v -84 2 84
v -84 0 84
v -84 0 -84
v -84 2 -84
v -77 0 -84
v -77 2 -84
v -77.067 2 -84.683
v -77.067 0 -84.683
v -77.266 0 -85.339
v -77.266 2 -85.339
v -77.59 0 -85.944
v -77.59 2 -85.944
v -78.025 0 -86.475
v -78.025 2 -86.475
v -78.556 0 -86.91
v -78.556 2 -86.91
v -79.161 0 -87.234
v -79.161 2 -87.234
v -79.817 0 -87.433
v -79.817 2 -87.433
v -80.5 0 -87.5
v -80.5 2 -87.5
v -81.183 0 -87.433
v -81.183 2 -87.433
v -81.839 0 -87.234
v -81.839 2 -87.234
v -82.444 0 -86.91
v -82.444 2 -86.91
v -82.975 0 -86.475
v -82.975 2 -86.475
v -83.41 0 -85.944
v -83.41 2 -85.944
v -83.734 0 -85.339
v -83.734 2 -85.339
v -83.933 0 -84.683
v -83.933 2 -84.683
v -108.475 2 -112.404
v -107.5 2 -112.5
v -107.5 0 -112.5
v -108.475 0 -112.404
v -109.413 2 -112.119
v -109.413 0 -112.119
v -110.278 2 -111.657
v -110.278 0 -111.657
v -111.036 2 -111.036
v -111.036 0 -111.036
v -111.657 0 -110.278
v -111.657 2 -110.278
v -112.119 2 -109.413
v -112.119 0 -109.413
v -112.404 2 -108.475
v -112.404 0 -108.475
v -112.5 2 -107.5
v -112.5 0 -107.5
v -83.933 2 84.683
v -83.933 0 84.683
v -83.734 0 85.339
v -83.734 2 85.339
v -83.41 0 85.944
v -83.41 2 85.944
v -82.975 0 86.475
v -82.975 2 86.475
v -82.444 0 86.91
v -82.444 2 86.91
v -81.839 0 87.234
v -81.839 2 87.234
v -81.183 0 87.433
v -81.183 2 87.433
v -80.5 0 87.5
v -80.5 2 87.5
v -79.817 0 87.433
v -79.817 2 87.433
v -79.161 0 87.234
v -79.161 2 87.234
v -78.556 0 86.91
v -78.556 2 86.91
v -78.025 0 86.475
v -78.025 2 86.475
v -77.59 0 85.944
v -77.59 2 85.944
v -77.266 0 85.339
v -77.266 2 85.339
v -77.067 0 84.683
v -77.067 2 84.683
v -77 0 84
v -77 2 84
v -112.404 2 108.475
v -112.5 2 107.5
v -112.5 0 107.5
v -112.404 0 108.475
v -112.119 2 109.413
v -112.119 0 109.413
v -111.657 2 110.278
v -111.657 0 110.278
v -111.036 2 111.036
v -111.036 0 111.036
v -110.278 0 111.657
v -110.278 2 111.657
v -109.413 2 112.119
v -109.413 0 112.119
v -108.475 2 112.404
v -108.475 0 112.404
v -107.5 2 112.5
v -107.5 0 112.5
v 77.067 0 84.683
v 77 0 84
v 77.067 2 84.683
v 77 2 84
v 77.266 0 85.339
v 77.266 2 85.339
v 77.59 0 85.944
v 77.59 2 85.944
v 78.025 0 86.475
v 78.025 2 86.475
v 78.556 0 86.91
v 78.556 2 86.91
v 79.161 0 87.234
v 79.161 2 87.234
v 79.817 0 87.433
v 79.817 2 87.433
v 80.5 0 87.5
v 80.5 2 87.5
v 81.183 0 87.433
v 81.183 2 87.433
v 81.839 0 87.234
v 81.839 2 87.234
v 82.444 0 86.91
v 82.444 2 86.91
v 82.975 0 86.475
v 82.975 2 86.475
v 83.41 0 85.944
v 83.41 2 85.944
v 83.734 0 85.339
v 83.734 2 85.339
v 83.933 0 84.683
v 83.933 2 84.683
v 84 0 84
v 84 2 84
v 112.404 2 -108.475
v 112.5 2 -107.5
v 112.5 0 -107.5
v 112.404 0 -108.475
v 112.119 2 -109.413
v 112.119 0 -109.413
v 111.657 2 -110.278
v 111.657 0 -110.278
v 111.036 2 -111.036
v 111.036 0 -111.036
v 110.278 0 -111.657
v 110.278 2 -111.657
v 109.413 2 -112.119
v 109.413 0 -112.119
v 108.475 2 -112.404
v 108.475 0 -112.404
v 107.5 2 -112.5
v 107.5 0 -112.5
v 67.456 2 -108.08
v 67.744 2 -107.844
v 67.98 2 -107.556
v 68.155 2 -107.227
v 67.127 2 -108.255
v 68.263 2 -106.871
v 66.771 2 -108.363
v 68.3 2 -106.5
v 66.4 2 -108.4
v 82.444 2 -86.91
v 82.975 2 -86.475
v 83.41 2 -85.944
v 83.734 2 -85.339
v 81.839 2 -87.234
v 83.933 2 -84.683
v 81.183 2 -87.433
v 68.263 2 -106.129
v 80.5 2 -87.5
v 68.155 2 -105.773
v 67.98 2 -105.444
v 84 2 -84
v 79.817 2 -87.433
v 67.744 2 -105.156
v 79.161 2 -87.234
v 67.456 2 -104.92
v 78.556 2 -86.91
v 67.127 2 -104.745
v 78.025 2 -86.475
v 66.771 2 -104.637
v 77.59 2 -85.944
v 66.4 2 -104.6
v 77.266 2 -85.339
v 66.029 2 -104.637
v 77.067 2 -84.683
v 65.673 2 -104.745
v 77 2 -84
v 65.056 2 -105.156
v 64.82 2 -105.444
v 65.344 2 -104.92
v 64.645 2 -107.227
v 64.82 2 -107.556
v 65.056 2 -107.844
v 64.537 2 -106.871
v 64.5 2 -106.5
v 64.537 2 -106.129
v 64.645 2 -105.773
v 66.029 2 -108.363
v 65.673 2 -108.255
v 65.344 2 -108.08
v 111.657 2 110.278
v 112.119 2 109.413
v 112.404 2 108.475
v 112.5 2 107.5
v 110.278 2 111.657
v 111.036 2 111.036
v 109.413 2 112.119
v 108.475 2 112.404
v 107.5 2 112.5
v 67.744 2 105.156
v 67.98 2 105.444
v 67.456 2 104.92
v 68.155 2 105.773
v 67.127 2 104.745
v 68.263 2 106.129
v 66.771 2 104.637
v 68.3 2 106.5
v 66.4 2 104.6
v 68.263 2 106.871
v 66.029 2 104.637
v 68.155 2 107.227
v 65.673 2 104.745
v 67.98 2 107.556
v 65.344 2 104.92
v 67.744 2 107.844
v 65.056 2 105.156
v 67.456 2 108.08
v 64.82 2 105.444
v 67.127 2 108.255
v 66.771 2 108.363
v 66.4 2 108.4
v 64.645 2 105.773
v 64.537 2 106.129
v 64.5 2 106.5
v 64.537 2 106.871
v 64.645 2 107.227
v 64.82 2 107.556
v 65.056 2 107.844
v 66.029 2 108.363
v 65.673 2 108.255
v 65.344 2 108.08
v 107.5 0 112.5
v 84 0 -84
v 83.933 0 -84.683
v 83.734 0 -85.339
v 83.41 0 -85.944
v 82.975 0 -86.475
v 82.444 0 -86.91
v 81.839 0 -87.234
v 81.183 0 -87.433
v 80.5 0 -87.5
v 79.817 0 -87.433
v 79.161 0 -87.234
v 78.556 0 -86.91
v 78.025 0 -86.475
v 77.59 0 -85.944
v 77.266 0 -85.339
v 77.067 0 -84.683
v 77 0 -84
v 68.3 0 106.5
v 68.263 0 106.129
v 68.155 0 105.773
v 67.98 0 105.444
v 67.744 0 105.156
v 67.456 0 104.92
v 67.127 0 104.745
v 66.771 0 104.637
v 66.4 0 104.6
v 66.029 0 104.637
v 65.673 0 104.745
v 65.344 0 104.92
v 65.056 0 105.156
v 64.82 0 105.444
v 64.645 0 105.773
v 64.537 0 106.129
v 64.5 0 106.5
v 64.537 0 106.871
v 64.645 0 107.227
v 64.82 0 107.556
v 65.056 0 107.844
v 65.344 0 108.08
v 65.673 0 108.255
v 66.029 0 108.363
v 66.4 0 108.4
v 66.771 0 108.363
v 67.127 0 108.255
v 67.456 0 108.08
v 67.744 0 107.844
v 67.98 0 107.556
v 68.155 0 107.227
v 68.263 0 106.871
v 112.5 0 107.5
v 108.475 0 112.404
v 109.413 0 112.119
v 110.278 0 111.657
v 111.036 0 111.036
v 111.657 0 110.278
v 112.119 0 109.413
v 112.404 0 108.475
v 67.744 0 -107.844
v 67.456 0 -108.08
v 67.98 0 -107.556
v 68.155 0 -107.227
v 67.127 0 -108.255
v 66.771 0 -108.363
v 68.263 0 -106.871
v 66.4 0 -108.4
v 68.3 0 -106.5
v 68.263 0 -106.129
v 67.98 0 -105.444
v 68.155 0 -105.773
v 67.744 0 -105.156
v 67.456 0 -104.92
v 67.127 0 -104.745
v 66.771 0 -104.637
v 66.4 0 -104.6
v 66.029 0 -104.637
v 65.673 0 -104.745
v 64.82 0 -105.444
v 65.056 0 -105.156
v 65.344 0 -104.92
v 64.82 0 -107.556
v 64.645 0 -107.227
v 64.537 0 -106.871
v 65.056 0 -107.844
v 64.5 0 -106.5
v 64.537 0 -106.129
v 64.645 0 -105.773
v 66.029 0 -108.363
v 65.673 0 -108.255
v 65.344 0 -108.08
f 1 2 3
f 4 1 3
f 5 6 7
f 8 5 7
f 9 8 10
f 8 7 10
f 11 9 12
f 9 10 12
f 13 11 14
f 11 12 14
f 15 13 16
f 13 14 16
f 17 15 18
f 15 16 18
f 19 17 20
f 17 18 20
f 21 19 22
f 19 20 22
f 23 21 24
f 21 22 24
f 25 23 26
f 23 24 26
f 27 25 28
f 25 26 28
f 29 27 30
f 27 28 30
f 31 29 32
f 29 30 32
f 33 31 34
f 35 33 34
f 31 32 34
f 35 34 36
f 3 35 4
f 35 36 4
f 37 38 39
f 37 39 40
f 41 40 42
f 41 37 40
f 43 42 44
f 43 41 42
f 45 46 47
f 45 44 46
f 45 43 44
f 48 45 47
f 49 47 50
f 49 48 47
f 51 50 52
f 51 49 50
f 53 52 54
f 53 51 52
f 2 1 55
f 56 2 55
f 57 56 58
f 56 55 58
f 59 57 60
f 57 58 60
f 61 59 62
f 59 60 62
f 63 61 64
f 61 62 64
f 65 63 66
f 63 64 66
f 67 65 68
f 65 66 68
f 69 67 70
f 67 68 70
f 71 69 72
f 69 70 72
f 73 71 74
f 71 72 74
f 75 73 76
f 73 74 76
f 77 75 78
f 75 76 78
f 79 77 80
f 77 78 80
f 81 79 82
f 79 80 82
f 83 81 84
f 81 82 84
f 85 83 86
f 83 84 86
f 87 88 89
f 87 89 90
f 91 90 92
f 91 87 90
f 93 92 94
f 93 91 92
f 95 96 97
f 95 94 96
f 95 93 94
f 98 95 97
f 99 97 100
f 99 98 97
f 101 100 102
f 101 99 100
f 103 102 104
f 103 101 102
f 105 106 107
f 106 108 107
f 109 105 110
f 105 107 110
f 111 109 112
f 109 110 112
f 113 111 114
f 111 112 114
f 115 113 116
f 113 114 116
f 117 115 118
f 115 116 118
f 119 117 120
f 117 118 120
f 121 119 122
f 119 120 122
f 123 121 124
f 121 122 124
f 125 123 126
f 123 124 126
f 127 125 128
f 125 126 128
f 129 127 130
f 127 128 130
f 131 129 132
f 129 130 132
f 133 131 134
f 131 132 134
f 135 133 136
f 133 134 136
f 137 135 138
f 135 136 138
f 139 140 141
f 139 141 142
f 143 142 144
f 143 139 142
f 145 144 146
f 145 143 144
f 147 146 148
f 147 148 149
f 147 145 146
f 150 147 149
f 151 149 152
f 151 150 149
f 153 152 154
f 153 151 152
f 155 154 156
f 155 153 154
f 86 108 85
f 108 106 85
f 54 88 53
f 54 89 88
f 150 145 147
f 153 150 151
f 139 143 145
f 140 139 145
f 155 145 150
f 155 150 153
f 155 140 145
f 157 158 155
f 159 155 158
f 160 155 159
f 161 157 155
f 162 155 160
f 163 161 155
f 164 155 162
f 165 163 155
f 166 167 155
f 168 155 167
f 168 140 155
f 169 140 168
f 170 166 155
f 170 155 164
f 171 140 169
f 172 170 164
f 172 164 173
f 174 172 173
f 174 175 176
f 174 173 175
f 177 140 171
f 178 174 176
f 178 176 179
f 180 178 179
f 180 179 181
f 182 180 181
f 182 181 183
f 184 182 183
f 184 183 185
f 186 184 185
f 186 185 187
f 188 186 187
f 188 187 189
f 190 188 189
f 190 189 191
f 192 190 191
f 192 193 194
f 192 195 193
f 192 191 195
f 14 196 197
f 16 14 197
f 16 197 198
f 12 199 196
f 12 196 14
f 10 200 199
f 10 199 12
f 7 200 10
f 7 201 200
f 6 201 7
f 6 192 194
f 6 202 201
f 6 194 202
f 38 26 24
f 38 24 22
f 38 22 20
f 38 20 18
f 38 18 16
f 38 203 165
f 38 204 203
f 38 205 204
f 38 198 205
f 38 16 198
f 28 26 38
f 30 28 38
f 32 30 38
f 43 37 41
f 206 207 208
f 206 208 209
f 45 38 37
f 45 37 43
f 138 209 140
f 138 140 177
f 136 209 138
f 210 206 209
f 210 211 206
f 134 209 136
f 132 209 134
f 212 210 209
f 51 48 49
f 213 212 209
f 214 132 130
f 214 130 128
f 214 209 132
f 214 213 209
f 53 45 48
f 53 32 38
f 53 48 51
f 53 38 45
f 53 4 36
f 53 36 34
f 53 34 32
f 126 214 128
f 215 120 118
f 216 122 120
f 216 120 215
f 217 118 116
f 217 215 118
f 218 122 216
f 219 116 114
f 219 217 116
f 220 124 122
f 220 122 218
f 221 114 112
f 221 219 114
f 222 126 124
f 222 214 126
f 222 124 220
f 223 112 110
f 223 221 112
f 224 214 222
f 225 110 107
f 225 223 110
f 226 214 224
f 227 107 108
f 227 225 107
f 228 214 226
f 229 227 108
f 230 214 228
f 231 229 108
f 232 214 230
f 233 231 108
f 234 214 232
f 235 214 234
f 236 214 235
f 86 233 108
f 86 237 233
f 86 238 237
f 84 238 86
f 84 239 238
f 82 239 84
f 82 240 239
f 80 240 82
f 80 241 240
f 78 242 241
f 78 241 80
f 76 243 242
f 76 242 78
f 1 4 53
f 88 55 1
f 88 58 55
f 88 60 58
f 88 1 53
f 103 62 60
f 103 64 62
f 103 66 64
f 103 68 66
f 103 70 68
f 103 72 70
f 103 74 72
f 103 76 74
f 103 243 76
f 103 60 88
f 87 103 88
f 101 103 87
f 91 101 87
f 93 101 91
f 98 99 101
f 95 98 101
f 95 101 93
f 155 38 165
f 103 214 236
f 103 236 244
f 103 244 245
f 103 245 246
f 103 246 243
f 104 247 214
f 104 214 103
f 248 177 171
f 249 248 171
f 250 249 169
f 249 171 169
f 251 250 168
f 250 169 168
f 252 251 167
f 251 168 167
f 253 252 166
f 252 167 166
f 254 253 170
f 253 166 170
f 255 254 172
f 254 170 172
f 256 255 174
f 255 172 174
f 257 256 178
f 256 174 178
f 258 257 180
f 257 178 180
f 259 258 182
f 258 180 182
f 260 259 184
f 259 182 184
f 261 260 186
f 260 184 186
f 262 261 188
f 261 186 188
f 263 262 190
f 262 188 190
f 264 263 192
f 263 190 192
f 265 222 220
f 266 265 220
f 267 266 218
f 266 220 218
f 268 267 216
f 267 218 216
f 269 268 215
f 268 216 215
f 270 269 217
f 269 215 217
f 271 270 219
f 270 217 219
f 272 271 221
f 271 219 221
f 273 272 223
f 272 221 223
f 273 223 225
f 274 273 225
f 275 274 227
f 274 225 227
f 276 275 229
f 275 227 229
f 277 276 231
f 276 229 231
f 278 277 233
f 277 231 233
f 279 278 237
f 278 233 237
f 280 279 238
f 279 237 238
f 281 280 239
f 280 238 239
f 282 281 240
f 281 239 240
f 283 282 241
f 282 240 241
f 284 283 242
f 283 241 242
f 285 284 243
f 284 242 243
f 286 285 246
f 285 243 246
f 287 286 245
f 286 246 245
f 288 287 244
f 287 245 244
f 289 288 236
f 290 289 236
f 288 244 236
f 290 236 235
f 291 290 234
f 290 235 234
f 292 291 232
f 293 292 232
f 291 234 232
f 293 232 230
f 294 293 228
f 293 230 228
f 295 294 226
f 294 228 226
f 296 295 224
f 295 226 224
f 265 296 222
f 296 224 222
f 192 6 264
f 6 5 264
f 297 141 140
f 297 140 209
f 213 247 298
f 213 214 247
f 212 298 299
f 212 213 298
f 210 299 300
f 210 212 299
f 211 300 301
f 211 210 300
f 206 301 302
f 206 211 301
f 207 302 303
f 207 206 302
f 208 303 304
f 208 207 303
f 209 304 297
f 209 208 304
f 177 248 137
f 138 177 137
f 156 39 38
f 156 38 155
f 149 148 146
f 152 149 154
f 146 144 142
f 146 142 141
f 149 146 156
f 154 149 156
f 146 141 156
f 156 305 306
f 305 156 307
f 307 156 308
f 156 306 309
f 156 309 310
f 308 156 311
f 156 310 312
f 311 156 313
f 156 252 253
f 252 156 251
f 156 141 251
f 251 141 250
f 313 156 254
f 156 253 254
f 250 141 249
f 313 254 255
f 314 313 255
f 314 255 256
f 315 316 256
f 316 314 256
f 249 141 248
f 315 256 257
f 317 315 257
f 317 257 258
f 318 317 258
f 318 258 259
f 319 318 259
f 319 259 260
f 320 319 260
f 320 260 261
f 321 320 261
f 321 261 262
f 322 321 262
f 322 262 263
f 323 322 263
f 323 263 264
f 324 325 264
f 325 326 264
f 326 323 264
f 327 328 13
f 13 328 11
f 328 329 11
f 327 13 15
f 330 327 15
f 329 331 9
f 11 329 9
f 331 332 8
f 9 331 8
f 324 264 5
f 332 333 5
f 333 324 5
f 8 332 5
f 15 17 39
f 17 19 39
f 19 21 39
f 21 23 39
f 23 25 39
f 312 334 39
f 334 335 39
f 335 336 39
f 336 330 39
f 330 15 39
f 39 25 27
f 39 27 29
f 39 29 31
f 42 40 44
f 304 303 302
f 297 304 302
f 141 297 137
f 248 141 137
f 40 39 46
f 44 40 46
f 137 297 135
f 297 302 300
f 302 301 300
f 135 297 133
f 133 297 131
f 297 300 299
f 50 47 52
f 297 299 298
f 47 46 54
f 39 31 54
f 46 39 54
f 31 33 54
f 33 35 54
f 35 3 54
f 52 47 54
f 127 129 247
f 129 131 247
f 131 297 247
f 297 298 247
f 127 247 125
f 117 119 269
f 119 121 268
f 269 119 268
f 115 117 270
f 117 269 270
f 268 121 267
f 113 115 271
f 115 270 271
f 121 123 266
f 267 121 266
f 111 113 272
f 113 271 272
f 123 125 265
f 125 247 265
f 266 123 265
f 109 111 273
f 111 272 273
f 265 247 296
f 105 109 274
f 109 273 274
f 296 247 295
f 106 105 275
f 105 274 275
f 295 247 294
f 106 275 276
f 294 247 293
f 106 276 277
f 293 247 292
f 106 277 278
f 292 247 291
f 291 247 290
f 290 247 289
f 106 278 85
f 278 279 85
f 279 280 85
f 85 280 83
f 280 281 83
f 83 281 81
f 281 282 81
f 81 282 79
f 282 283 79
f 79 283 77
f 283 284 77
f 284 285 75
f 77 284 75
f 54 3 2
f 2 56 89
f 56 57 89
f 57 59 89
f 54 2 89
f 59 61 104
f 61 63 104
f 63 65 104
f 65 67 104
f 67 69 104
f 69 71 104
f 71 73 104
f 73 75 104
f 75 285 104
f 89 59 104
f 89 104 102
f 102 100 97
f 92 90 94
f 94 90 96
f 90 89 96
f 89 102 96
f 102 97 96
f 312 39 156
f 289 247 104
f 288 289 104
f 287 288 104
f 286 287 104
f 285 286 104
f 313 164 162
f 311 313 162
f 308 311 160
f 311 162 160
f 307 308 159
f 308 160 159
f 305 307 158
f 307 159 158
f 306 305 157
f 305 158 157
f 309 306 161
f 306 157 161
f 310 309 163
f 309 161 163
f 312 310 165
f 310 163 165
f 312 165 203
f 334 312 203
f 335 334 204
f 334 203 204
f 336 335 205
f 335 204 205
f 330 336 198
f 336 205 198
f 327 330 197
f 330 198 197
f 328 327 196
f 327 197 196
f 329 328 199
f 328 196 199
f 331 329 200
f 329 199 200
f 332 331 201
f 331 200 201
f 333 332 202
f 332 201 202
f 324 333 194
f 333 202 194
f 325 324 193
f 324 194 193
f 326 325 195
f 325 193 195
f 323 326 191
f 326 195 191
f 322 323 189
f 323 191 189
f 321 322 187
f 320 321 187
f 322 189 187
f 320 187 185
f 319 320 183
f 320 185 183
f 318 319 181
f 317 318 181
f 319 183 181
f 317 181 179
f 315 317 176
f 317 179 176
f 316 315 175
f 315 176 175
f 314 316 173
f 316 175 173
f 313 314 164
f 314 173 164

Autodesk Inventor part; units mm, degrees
ref_plane "YZ Plane" through (0, 0, 0) normal (1, 0, 0) x (0, 1, 0)
ref_plane "XZ Plane" through (0, 0, 0) normal (0, 1, 0) x (-1, 0, 0)
ref_plane "XY Plane" through (0, 0, 0) normal (0, 0, 1) x (1, 0, 0)
sketch "Sketch1" plane through (0, 0, 0) normal (0, 1, 0) x (-1, 0, 0)
  line L0 (-84, 84) -> (84, 84)
  line L1 (84, 84) -> (84, -84)
  line L2 (84, -84) -> (-84, -84)
  line L3 (-84, -84) -> (-84, 84)
  line L4 (-84, 84) -> (84, -84) construction
  line L5 (84, 84) -> (-84, -84) construction
  line L6 (-112.5, 112.5) -> (112.5, 112.5)
  line L7 (112.5, 112.5) -> (112.5, -112.5)
  line L8 (112.5, -112.5) -> (-112.5, -112.5)
  line L9 (-112.5, -112.5) -> (-112.5, 112.5)
  line L10 (-112.5, 112.5) -> (112.5, -112.5) construction
  line L11 (112.5, 112.5) -> (-112.5, -112.5) construction
  point P0 (0, 0)
  dimension "d0" = 168
  dimension "d1" = 168
  dimension "d2" = 225
  dimension "d3" = 225
extrude "Extrusion1" add sketch "Sketch1" along normal blind 2
sketch "Sketch2" plane through (0, 2, 0) normal (0, 1, 0) x (1, 0, 0)
  line L0 (0, 0) -> (-112.5, 0) construction
  line L1 (-112.5, 112.5) -> (-112.5, -112.5) projected
  circle A0 centre (66.4, -106.5) radius 1.9
  circle A1 centre (66.4, 106.5) radius 1.9
  dimension "d6" = 66.4
  dimension "d7" = 3.8
  dimension "d8" = 106.5
extrude "Extrusion2" cut sketch "Sketch2" against normal blind 2
fillet "Fillet1" radius 5 4 edges at (112.5, 1, -112.5) (112.5, 1, 112.5) (-112.5, 1, -112.5) (-112.5, 1, 112.5)
sketch "Sketch3" plane through (0, 2, 0) normal (0, 1, 0) x (1, 0, 0)
  line L0 (84, 84) -> (84, -84) projected
  circle A0 centre (80.5, -84) radius 3.5
  line L1 (-84, -84) -> (-84, 84) projected
  line L2 (0, 0) -> (-84, 0) construction
  line L3 (0, 0) -> (0, -84) construction
  line L4 (84, -84) -> (-84, -84) projected
  circle A1 centre (-80.5, -84) radius 3.5
  circle A2 centre (80.5, 84) radius 3.5
  circle A3 centre (-80.5, 84) radius 3.5
  point P0 (-84, -84)
  point P1 (-77, -84)
  dimension "d12" = 7
extrude "Extrusion3" cut sketch "Sketch3" against normal blind 2 contours A3 | A1 L4 | A0 L4 | L4 A0 | A2 picked at (-79.4331, -84.8214)
properties part number "Limiter"
